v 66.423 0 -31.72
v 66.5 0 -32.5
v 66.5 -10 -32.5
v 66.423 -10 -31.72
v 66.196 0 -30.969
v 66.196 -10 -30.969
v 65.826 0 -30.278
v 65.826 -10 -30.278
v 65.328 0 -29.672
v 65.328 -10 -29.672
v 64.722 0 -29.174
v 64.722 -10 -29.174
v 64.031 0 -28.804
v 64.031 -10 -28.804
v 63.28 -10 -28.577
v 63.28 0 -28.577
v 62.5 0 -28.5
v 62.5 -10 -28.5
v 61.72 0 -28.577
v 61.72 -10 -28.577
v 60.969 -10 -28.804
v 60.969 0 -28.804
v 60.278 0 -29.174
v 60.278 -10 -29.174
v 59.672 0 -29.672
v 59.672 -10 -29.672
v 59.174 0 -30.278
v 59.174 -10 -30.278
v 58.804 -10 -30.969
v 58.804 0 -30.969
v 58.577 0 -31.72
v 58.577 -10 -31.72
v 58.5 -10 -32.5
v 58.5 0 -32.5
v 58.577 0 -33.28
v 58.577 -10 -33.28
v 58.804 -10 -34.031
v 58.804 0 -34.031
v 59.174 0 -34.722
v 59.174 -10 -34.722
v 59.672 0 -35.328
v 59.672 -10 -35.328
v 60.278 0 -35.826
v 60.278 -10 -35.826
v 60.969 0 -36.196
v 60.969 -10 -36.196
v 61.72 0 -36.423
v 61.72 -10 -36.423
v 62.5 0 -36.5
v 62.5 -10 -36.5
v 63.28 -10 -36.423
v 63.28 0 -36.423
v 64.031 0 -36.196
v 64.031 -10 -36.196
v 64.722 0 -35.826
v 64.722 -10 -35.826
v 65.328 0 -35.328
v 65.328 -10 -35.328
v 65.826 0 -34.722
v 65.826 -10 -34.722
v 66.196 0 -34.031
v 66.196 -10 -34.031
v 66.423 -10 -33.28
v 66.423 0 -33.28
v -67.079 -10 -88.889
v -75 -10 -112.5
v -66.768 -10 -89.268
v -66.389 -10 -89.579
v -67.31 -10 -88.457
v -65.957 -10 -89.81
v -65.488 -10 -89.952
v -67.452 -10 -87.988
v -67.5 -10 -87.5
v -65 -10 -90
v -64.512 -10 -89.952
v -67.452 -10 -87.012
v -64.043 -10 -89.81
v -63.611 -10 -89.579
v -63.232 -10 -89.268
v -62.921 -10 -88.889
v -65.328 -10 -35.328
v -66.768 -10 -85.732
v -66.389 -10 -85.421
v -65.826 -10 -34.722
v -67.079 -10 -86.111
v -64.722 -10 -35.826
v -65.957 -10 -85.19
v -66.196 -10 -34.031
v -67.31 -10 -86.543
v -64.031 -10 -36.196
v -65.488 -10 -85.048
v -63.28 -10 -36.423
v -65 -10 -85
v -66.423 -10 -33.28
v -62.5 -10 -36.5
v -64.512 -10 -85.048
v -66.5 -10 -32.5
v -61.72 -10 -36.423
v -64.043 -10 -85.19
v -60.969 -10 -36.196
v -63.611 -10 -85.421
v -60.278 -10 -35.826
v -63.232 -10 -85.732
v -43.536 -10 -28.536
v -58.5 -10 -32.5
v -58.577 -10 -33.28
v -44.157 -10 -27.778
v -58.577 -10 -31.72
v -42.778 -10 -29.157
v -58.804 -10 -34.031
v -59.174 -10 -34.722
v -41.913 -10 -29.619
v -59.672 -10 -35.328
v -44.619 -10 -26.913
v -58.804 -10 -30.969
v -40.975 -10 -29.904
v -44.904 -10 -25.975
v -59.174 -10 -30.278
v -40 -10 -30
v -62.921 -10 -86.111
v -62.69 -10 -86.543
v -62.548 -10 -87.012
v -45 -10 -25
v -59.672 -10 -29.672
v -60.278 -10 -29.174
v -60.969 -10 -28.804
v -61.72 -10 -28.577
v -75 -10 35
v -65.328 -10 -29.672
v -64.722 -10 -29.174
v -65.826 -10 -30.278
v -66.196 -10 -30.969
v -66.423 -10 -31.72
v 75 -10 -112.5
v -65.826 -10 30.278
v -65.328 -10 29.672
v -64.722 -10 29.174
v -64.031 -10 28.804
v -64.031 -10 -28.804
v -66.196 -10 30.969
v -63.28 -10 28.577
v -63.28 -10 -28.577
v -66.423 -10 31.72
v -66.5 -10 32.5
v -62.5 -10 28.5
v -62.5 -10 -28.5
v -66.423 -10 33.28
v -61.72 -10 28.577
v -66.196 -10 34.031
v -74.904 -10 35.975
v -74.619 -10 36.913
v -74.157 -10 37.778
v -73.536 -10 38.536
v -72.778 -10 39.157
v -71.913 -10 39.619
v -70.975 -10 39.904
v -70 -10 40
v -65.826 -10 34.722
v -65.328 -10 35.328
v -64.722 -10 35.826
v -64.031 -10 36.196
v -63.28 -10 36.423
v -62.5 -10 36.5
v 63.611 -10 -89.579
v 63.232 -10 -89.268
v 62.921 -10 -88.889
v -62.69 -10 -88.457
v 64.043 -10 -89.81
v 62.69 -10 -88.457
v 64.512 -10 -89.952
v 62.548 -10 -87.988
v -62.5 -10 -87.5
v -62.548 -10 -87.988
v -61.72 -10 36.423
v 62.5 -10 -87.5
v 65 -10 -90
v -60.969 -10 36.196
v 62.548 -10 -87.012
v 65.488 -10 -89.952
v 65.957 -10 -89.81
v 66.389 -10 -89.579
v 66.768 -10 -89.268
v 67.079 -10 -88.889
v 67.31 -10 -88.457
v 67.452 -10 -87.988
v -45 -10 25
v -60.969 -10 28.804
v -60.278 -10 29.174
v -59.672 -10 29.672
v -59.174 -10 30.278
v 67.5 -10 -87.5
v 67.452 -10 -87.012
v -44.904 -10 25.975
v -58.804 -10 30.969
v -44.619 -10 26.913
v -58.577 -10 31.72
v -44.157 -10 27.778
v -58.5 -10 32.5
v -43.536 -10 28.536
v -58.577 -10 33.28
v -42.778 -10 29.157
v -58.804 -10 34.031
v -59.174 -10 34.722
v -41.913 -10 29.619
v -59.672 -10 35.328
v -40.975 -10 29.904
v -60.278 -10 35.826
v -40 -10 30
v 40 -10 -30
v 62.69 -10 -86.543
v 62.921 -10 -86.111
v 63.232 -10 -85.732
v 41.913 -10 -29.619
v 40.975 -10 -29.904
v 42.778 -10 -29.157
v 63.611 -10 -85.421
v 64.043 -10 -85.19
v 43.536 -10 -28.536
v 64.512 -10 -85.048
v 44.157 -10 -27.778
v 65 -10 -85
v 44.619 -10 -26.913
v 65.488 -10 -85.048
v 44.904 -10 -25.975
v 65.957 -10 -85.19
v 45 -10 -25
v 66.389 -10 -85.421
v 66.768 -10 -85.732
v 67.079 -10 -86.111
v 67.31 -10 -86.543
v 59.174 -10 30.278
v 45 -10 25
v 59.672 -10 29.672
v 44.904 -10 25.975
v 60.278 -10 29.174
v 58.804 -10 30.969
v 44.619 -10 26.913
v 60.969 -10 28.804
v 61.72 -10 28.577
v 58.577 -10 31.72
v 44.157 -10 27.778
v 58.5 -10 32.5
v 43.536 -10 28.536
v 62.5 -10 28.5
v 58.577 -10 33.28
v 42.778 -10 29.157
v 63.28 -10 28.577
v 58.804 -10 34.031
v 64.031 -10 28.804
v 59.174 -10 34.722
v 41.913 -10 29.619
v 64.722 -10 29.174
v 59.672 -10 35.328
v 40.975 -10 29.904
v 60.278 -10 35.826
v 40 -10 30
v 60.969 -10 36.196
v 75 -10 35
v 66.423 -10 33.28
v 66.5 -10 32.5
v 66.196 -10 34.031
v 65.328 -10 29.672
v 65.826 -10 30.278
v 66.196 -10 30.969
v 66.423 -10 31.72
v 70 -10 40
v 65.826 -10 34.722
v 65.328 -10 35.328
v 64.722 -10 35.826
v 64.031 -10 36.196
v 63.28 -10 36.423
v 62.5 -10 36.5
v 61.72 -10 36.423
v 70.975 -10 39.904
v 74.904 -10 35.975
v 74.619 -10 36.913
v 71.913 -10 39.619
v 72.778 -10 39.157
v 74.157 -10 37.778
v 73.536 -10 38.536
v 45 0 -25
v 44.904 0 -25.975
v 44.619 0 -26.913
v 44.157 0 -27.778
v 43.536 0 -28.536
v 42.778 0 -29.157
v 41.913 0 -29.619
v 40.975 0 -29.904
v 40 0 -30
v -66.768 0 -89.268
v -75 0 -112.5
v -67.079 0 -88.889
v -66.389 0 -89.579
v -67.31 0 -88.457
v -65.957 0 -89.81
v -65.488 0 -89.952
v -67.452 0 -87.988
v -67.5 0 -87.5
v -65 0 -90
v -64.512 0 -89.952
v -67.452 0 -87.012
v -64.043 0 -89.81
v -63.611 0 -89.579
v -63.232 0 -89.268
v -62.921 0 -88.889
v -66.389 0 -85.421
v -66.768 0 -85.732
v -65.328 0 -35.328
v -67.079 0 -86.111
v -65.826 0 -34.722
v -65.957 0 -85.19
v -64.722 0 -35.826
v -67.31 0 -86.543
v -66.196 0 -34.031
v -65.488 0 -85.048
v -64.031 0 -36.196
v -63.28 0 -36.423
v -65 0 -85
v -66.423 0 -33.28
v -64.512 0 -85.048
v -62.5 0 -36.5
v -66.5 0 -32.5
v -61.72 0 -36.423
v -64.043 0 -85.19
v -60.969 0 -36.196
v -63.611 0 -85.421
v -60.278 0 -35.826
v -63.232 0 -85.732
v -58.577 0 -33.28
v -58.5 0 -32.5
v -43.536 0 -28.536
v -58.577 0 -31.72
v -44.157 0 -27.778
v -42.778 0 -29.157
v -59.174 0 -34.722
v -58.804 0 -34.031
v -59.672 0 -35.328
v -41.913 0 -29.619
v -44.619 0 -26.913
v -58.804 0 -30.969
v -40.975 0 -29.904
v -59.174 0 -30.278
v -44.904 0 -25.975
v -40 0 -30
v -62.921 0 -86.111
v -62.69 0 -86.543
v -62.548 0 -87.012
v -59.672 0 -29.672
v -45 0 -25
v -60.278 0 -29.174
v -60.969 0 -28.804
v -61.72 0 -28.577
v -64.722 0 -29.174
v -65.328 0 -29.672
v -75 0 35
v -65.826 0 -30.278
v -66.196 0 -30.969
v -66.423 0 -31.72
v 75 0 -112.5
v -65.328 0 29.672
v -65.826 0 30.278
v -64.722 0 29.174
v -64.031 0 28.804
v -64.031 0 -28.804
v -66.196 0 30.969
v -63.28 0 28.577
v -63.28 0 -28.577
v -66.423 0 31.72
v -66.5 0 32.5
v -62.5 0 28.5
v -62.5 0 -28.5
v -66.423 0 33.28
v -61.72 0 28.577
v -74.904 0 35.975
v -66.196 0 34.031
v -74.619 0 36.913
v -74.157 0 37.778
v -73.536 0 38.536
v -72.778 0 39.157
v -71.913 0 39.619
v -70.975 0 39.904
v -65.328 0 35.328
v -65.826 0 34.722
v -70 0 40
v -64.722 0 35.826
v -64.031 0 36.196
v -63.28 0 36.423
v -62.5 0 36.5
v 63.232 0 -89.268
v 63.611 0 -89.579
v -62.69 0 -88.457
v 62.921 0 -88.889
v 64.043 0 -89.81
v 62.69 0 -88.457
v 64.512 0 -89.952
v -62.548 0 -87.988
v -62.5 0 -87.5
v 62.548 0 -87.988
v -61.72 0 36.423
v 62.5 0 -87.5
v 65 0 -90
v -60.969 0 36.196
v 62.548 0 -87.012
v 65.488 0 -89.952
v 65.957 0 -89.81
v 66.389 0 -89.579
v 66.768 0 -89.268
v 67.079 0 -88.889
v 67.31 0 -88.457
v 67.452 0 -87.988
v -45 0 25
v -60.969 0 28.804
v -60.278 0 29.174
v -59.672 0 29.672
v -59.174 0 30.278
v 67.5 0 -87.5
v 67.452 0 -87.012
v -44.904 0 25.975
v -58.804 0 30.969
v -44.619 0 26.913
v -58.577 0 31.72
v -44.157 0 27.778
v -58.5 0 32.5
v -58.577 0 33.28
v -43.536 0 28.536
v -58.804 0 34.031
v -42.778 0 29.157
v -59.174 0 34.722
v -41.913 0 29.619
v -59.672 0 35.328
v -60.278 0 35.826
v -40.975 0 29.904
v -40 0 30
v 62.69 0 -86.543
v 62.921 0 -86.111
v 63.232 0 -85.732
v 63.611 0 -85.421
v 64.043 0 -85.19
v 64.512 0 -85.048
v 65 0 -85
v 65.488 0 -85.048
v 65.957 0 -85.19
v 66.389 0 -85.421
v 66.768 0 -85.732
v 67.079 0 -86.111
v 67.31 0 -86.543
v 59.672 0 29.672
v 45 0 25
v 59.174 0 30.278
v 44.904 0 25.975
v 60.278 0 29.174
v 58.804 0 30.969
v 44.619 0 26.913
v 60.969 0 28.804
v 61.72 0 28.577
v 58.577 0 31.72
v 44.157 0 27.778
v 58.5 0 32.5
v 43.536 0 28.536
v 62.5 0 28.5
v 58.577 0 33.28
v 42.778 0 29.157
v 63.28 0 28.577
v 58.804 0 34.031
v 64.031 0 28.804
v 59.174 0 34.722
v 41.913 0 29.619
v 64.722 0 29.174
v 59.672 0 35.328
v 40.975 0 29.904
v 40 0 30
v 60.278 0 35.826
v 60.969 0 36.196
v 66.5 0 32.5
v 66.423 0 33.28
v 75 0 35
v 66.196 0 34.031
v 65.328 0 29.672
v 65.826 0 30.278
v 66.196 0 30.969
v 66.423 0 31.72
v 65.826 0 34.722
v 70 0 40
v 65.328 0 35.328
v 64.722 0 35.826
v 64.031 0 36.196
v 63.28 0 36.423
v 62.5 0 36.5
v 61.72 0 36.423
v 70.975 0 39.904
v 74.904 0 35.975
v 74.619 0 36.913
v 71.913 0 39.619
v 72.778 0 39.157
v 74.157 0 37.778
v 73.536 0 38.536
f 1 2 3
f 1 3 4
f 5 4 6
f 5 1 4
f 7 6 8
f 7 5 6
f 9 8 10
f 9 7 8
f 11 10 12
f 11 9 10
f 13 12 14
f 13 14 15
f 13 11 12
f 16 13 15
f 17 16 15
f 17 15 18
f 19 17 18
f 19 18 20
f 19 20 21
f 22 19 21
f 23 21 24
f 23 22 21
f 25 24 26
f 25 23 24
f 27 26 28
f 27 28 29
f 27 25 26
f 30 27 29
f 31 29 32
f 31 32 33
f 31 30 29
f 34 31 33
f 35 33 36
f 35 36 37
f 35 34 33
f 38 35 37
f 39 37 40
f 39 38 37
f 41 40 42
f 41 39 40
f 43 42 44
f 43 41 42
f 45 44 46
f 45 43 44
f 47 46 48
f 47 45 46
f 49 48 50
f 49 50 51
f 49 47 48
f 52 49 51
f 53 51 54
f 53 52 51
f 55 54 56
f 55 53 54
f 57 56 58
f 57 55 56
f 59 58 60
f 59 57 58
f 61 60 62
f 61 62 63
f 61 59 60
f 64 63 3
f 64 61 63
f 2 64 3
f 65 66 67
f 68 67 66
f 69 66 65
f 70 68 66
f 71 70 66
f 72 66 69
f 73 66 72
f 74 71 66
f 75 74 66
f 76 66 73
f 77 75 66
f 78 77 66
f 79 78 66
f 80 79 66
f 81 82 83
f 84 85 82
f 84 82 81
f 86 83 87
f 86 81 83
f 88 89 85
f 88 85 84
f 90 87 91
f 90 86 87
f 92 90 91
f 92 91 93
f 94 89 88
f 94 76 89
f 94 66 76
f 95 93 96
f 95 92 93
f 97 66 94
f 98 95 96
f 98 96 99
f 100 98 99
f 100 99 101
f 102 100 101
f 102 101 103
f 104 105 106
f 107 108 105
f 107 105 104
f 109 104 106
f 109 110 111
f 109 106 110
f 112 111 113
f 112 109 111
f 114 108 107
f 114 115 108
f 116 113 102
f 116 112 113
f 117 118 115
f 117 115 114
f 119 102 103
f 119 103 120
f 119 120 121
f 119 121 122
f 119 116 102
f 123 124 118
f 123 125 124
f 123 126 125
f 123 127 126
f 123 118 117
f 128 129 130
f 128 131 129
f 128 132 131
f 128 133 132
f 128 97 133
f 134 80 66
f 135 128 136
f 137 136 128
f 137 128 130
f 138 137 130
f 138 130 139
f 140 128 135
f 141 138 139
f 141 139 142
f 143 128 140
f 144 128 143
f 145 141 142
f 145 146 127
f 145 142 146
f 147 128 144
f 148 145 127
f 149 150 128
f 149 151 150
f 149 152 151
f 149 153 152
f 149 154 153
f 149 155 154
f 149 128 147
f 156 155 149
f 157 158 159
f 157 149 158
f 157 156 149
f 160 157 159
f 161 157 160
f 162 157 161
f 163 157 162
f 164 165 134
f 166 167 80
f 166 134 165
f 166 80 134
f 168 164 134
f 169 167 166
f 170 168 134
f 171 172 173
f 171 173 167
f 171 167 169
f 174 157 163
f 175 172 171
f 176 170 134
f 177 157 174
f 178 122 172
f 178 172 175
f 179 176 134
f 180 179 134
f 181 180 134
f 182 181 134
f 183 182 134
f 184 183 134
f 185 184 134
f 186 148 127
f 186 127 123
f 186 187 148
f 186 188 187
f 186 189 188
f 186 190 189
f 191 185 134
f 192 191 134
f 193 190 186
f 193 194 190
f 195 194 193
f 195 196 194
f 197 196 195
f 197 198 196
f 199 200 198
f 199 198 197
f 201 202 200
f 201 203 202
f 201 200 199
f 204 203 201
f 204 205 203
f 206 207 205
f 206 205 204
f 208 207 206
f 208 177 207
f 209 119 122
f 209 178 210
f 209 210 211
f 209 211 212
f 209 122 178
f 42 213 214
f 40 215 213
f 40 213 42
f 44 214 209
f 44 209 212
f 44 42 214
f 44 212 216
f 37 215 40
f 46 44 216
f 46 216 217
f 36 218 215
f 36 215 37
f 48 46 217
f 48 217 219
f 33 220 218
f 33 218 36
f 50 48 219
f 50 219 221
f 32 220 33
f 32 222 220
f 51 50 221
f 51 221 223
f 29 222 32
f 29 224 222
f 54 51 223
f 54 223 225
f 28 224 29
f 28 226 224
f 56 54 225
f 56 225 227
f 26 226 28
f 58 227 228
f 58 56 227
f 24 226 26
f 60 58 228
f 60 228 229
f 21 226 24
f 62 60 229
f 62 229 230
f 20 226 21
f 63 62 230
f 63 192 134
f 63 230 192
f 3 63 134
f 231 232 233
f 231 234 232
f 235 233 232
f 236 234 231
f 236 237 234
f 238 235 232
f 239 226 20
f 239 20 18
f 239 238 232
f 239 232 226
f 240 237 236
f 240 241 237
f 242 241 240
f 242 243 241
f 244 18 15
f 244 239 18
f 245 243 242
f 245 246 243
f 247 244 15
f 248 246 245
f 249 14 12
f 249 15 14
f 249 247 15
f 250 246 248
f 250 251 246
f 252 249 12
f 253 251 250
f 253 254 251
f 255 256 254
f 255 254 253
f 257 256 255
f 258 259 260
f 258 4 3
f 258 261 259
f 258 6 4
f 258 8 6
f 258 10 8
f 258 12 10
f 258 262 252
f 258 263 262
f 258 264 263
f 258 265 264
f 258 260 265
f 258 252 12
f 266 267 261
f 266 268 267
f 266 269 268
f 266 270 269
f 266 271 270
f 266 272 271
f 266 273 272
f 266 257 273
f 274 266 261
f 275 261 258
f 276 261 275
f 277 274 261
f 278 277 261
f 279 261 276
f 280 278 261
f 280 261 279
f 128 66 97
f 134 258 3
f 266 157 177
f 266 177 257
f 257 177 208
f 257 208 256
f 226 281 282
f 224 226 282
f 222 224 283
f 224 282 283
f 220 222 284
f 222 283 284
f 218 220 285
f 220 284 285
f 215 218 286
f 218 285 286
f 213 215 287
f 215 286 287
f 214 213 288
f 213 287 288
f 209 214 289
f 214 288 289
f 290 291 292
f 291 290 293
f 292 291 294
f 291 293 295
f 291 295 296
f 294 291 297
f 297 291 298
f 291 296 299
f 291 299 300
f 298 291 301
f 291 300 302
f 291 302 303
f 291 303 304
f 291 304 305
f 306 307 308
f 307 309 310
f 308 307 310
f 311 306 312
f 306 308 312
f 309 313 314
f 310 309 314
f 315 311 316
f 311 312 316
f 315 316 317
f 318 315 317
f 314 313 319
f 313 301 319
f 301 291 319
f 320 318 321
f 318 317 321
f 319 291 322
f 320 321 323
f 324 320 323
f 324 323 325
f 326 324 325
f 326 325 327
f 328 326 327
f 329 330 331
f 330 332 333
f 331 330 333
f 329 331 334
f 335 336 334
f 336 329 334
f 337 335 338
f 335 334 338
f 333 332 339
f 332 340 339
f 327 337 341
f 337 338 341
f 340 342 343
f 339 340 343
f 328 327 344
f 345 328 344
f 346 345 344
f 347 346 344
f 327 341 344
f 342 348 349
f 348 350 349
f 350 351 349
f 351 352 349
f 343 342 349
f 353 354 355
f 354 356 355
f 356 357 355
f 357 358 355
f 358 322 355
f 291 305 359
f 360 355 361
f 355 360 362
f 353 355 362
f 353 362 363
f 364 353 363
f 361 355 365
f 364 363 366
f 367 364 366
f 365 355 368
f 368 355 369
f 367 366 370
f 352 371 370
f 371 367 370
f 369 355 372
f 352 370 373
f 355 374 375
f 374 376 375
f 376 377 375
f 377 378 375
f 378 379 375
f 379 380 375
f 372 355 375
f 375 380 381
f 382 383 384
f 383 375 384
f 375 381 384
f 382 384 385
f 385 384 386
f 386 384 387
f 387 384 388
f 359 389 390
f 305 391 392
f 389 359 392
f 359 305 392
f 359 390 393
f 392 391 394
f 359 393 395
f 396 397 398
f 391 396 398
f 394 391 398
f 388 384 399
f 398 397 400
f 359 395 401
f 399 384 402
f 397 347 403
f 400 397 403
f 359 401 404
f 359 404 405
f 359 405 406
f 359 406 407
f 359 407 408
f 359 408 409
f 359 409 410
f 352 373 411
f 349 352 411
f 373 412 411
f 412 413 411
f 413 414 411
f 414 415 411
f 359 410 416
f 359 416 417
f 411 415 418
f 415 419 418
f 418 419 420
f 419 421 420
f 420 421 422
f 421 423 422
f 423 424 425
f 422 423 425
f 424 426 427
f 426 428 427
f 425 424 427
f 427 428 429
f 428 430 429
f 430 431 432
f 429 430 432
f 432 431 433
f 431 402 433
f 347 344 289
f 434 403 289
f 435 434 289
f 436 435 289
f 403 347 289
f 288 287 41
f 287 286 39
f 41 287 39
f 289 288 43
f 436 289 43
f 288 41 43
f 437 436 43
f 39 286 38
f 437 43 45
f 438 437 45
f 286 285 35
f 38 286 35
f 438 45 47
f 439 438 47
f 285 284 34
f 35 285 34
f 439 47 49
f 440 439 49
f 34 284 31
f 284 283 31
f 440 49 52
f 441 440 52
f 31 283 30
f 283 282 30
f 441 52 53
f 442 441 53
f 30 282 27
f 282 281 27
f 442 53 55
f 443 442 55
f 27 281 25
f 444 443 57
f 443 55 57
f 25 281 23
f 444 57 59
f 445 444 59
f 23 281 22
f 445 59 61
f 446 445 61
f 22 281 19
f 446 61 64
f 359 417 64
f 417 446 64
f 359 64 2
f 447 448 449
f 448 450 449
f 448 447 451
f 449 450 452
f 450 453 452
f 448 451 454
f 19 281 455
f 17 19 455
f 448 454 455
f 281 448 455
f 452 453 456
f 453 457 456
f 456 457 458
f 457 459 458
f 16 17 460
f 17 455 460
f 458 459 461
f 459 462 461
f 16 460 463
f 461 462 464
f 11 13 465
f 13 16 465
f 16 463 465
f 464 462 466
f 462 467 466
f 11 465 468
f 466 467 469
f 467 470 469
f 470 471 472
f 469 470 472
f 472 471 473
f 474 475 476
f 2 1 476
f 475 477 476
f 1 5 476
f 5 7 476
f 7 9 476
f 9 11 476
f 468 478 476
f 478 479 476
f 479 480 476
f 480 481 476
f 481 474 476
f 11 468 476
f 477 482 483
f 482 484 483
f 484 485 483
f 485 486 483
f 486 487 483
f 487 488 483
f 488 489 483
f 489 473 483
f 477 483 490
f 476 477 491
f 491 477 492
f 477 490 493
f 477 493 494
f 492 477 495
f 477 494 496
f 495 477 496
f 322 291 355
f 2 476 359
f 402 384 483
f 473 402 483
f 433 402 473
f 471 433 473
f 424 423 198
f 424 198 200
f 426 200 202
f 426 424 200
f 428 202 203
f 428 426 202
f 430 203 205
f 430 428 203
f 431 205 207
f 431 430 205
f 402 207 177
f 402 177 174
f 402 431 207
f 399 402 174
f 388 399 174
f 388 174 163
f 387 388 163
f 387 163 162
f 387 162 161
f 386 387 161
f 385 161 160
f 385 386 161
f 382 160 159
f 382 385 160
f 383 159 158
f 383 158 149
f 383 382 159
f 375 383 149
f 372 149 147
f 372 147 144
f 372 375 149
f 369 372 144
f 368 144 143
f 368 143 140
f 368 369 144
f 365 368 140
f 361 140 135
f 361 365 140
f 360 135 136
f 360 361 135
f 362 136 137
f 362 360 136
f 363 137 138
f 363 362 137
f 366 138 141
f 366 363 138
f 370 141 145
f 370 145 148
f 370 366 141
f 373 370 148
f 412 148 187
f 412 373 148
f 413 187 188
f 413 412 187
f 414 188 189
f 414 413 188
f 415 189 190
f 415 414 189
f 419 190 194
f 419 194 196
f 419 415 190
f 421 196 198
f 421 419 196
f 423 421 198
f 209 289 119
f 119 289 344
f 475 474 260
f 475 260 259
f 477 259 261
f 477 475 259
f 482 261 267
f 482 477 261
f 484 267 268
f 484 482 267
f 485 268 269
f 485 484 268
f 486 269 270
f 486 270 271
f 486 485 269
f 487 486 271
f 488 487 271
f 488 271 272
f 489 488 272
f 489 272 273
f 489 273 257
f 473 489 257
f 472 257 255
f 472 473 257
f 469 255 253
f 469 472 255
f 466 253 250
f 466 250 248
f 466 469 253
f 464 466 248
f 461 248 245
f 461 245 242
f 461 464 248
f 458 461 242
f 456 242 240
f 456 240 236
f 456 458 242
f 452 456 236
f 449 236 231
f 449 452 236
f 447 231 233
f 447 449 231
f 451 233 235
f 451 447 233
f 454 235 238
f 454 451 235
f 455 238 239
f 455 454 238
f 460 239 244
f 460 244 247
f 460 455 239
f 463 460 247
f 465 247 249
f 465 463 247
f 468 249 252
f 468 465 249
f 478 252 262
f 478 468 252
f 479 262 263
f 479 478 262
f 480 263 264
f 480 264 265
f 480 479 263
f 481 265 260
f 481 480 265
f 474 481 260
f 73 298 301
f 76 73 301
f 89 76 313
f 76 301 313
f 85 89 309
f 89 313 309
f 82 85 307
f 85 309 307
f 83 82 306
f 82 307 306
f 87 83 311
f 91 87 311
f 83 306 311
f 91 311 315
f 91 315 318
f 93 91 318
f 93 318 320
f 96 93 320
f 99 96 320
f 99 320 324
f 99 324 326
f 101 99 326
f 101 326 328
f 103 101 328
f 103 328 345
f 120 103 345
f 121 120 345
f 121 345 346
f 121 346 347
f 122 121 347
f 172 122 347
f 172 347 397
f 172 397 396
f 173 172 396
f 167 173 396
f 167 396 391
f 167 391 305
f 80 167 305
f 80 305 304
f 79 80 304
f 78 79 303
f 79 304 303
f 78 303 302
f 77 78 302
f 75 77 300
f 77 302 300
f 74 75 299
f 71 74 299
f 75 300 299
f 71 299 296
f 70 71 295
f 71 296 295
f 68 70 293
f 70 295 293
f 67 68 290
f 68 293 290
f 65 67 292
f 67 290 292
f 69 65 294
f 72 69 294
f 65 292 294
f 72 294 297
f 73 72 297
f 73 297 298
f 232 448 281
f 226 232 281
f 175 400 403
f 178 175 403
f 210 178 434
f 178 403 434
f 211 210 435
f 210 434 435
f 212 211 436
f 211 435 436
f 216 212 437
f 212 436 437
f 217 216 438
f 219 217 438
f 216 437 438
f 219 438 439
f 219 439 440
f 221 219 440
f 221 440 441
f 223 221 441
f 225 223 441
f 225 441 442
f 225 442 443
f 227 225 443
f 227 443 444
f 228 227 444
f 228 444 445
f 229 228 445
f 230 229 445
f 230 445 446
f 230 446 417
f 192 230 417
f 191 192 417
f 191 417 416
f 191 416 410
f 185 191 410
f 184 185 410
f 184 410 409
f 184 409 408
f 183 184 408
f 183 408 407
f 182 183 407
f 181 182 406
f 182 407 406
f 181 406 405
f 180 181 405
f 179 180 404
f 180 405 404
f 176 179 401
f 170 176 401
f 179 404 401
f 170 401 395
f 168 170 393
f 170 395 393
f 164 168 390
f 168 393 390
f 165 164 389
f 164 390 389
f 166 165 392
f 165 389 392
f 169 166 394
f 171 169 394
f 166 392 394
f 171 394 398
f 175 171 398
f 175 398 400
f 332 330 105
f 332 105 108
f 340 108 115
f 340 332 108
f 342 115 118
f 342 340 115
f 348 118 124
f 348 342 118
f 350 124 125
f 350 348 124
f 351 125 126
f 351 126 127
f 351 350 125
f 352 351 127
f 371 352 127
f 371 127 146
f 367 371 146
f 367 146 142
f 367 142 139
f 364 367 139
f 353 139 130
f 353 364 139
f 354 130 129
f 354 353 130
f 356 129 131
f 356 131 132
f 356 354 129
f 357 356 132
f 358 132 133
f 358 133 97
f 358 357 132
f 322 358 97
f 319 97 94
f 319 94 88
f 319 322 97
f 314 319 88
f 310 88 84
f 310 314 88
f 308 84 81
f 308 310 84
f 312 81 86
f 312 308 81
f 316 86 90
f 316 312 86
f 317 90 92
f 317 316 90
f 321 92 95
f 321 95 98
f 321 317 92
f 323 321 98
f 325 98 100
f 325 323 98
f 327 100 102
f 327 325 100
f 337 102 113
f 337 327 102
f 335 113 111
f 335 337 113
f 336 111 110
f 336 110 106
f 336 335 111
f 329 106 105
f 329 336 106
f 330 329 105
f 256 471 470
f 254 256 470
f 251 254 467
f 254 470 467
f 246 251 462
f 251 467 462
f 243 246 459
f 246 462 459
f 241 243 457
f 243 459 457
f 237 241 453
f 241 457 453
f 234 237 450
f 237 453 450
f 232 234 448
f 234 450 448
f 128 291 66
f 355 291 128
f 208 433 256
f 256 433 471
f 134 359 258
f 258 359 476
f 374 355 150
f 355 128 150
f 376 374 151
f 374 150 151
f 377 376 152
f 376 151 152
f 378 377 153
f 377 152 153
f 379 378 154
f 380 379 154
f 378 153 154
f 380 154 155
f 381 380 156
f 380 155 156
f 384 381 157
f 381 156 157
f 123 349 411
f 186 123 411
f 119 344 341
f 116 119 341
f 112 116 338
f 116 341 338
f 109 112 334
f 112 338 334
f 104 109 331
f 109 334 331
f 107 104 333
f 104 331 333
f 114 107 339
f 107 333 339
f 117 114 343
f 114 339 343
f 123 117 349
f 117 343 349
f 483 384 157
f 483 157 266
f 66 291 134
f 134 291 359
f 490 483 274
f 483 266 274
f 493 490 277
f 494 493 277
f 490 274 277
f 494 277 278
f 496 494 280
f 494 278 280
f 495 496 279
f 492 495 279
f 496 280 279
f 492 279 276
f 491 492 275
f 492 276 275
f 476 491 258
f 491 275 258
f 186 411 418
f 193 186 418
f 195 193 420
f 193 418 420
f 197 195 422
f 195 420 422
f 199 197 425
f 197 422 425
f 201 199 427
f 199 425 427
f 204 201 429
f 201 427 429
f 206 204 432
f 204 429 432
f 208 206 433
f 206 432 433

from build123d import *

# Parameters (mm, degrees)
F0_W     = 150
F0_H     = 152.5
F0_R     = 4
F1_DEPTH = 10
F2_R     = 5
F4_D     = 5


with BuildPart() as f1:
    # F0 (on Front) → F1 (new body)
    with BuildSketch(Plane.XZ):
        with Locations((0, -36.25)):
            Rectangle(F0_W, F0_H)
        with Locations((-62.5, -32.5)):
            Circle(F0_R, mode=Mode.SUBTRACT)
        with Locations((-62.5, 32.5)):
            Circle(F0_R, mode=Mode.SUBTRACT)
        with BuildLine():
            Line((-40, 30), (40, 30))
            ThreePointArc((40, 30), (43.5355339059, 28.5355339059), (45, 25))
            Line((45, 25), (45, -25))
            ThreePointArc((45, -25), (43.5355339059, -28.5355339059), (40, -30))
            Line((40, -30), (-40, -30))
            ThreePointArc((-40, -30), (-43.5355339059, -28.5355339059), (-45, -25))
            Line((-45, -25), (-45, 25))
            ThreePointArc((-45, 25), (-43.5355339059, 28.5355339059), (-40, 30))
        make_face(mode=Mode.SUBTRACT)
        with Locations((62.5, -32.5)):
            Circle(F0_R, mode=Mode.SUBTRACT)
        with Locations((62.5, 32.5)):
            Circle(F0_R, mode=Mode.SUBTRACT)
    extrude(amount=F1_DEPTH)

    # F2
    f2_edges = [f1.edges().sort_by_distance(p)[0] for p in [
        (-75, -5, 40),
        (75, -5, 40),
    ]]
    fillet(f2_edges, radius=F2_R)

    # F4 (through all)
    with Locations(Plane.XZ.offset(10)):
        with Locations((65, -87.5), (-65, -87.5)):
            Hole(F4_D / 2)


solid = f1.part
